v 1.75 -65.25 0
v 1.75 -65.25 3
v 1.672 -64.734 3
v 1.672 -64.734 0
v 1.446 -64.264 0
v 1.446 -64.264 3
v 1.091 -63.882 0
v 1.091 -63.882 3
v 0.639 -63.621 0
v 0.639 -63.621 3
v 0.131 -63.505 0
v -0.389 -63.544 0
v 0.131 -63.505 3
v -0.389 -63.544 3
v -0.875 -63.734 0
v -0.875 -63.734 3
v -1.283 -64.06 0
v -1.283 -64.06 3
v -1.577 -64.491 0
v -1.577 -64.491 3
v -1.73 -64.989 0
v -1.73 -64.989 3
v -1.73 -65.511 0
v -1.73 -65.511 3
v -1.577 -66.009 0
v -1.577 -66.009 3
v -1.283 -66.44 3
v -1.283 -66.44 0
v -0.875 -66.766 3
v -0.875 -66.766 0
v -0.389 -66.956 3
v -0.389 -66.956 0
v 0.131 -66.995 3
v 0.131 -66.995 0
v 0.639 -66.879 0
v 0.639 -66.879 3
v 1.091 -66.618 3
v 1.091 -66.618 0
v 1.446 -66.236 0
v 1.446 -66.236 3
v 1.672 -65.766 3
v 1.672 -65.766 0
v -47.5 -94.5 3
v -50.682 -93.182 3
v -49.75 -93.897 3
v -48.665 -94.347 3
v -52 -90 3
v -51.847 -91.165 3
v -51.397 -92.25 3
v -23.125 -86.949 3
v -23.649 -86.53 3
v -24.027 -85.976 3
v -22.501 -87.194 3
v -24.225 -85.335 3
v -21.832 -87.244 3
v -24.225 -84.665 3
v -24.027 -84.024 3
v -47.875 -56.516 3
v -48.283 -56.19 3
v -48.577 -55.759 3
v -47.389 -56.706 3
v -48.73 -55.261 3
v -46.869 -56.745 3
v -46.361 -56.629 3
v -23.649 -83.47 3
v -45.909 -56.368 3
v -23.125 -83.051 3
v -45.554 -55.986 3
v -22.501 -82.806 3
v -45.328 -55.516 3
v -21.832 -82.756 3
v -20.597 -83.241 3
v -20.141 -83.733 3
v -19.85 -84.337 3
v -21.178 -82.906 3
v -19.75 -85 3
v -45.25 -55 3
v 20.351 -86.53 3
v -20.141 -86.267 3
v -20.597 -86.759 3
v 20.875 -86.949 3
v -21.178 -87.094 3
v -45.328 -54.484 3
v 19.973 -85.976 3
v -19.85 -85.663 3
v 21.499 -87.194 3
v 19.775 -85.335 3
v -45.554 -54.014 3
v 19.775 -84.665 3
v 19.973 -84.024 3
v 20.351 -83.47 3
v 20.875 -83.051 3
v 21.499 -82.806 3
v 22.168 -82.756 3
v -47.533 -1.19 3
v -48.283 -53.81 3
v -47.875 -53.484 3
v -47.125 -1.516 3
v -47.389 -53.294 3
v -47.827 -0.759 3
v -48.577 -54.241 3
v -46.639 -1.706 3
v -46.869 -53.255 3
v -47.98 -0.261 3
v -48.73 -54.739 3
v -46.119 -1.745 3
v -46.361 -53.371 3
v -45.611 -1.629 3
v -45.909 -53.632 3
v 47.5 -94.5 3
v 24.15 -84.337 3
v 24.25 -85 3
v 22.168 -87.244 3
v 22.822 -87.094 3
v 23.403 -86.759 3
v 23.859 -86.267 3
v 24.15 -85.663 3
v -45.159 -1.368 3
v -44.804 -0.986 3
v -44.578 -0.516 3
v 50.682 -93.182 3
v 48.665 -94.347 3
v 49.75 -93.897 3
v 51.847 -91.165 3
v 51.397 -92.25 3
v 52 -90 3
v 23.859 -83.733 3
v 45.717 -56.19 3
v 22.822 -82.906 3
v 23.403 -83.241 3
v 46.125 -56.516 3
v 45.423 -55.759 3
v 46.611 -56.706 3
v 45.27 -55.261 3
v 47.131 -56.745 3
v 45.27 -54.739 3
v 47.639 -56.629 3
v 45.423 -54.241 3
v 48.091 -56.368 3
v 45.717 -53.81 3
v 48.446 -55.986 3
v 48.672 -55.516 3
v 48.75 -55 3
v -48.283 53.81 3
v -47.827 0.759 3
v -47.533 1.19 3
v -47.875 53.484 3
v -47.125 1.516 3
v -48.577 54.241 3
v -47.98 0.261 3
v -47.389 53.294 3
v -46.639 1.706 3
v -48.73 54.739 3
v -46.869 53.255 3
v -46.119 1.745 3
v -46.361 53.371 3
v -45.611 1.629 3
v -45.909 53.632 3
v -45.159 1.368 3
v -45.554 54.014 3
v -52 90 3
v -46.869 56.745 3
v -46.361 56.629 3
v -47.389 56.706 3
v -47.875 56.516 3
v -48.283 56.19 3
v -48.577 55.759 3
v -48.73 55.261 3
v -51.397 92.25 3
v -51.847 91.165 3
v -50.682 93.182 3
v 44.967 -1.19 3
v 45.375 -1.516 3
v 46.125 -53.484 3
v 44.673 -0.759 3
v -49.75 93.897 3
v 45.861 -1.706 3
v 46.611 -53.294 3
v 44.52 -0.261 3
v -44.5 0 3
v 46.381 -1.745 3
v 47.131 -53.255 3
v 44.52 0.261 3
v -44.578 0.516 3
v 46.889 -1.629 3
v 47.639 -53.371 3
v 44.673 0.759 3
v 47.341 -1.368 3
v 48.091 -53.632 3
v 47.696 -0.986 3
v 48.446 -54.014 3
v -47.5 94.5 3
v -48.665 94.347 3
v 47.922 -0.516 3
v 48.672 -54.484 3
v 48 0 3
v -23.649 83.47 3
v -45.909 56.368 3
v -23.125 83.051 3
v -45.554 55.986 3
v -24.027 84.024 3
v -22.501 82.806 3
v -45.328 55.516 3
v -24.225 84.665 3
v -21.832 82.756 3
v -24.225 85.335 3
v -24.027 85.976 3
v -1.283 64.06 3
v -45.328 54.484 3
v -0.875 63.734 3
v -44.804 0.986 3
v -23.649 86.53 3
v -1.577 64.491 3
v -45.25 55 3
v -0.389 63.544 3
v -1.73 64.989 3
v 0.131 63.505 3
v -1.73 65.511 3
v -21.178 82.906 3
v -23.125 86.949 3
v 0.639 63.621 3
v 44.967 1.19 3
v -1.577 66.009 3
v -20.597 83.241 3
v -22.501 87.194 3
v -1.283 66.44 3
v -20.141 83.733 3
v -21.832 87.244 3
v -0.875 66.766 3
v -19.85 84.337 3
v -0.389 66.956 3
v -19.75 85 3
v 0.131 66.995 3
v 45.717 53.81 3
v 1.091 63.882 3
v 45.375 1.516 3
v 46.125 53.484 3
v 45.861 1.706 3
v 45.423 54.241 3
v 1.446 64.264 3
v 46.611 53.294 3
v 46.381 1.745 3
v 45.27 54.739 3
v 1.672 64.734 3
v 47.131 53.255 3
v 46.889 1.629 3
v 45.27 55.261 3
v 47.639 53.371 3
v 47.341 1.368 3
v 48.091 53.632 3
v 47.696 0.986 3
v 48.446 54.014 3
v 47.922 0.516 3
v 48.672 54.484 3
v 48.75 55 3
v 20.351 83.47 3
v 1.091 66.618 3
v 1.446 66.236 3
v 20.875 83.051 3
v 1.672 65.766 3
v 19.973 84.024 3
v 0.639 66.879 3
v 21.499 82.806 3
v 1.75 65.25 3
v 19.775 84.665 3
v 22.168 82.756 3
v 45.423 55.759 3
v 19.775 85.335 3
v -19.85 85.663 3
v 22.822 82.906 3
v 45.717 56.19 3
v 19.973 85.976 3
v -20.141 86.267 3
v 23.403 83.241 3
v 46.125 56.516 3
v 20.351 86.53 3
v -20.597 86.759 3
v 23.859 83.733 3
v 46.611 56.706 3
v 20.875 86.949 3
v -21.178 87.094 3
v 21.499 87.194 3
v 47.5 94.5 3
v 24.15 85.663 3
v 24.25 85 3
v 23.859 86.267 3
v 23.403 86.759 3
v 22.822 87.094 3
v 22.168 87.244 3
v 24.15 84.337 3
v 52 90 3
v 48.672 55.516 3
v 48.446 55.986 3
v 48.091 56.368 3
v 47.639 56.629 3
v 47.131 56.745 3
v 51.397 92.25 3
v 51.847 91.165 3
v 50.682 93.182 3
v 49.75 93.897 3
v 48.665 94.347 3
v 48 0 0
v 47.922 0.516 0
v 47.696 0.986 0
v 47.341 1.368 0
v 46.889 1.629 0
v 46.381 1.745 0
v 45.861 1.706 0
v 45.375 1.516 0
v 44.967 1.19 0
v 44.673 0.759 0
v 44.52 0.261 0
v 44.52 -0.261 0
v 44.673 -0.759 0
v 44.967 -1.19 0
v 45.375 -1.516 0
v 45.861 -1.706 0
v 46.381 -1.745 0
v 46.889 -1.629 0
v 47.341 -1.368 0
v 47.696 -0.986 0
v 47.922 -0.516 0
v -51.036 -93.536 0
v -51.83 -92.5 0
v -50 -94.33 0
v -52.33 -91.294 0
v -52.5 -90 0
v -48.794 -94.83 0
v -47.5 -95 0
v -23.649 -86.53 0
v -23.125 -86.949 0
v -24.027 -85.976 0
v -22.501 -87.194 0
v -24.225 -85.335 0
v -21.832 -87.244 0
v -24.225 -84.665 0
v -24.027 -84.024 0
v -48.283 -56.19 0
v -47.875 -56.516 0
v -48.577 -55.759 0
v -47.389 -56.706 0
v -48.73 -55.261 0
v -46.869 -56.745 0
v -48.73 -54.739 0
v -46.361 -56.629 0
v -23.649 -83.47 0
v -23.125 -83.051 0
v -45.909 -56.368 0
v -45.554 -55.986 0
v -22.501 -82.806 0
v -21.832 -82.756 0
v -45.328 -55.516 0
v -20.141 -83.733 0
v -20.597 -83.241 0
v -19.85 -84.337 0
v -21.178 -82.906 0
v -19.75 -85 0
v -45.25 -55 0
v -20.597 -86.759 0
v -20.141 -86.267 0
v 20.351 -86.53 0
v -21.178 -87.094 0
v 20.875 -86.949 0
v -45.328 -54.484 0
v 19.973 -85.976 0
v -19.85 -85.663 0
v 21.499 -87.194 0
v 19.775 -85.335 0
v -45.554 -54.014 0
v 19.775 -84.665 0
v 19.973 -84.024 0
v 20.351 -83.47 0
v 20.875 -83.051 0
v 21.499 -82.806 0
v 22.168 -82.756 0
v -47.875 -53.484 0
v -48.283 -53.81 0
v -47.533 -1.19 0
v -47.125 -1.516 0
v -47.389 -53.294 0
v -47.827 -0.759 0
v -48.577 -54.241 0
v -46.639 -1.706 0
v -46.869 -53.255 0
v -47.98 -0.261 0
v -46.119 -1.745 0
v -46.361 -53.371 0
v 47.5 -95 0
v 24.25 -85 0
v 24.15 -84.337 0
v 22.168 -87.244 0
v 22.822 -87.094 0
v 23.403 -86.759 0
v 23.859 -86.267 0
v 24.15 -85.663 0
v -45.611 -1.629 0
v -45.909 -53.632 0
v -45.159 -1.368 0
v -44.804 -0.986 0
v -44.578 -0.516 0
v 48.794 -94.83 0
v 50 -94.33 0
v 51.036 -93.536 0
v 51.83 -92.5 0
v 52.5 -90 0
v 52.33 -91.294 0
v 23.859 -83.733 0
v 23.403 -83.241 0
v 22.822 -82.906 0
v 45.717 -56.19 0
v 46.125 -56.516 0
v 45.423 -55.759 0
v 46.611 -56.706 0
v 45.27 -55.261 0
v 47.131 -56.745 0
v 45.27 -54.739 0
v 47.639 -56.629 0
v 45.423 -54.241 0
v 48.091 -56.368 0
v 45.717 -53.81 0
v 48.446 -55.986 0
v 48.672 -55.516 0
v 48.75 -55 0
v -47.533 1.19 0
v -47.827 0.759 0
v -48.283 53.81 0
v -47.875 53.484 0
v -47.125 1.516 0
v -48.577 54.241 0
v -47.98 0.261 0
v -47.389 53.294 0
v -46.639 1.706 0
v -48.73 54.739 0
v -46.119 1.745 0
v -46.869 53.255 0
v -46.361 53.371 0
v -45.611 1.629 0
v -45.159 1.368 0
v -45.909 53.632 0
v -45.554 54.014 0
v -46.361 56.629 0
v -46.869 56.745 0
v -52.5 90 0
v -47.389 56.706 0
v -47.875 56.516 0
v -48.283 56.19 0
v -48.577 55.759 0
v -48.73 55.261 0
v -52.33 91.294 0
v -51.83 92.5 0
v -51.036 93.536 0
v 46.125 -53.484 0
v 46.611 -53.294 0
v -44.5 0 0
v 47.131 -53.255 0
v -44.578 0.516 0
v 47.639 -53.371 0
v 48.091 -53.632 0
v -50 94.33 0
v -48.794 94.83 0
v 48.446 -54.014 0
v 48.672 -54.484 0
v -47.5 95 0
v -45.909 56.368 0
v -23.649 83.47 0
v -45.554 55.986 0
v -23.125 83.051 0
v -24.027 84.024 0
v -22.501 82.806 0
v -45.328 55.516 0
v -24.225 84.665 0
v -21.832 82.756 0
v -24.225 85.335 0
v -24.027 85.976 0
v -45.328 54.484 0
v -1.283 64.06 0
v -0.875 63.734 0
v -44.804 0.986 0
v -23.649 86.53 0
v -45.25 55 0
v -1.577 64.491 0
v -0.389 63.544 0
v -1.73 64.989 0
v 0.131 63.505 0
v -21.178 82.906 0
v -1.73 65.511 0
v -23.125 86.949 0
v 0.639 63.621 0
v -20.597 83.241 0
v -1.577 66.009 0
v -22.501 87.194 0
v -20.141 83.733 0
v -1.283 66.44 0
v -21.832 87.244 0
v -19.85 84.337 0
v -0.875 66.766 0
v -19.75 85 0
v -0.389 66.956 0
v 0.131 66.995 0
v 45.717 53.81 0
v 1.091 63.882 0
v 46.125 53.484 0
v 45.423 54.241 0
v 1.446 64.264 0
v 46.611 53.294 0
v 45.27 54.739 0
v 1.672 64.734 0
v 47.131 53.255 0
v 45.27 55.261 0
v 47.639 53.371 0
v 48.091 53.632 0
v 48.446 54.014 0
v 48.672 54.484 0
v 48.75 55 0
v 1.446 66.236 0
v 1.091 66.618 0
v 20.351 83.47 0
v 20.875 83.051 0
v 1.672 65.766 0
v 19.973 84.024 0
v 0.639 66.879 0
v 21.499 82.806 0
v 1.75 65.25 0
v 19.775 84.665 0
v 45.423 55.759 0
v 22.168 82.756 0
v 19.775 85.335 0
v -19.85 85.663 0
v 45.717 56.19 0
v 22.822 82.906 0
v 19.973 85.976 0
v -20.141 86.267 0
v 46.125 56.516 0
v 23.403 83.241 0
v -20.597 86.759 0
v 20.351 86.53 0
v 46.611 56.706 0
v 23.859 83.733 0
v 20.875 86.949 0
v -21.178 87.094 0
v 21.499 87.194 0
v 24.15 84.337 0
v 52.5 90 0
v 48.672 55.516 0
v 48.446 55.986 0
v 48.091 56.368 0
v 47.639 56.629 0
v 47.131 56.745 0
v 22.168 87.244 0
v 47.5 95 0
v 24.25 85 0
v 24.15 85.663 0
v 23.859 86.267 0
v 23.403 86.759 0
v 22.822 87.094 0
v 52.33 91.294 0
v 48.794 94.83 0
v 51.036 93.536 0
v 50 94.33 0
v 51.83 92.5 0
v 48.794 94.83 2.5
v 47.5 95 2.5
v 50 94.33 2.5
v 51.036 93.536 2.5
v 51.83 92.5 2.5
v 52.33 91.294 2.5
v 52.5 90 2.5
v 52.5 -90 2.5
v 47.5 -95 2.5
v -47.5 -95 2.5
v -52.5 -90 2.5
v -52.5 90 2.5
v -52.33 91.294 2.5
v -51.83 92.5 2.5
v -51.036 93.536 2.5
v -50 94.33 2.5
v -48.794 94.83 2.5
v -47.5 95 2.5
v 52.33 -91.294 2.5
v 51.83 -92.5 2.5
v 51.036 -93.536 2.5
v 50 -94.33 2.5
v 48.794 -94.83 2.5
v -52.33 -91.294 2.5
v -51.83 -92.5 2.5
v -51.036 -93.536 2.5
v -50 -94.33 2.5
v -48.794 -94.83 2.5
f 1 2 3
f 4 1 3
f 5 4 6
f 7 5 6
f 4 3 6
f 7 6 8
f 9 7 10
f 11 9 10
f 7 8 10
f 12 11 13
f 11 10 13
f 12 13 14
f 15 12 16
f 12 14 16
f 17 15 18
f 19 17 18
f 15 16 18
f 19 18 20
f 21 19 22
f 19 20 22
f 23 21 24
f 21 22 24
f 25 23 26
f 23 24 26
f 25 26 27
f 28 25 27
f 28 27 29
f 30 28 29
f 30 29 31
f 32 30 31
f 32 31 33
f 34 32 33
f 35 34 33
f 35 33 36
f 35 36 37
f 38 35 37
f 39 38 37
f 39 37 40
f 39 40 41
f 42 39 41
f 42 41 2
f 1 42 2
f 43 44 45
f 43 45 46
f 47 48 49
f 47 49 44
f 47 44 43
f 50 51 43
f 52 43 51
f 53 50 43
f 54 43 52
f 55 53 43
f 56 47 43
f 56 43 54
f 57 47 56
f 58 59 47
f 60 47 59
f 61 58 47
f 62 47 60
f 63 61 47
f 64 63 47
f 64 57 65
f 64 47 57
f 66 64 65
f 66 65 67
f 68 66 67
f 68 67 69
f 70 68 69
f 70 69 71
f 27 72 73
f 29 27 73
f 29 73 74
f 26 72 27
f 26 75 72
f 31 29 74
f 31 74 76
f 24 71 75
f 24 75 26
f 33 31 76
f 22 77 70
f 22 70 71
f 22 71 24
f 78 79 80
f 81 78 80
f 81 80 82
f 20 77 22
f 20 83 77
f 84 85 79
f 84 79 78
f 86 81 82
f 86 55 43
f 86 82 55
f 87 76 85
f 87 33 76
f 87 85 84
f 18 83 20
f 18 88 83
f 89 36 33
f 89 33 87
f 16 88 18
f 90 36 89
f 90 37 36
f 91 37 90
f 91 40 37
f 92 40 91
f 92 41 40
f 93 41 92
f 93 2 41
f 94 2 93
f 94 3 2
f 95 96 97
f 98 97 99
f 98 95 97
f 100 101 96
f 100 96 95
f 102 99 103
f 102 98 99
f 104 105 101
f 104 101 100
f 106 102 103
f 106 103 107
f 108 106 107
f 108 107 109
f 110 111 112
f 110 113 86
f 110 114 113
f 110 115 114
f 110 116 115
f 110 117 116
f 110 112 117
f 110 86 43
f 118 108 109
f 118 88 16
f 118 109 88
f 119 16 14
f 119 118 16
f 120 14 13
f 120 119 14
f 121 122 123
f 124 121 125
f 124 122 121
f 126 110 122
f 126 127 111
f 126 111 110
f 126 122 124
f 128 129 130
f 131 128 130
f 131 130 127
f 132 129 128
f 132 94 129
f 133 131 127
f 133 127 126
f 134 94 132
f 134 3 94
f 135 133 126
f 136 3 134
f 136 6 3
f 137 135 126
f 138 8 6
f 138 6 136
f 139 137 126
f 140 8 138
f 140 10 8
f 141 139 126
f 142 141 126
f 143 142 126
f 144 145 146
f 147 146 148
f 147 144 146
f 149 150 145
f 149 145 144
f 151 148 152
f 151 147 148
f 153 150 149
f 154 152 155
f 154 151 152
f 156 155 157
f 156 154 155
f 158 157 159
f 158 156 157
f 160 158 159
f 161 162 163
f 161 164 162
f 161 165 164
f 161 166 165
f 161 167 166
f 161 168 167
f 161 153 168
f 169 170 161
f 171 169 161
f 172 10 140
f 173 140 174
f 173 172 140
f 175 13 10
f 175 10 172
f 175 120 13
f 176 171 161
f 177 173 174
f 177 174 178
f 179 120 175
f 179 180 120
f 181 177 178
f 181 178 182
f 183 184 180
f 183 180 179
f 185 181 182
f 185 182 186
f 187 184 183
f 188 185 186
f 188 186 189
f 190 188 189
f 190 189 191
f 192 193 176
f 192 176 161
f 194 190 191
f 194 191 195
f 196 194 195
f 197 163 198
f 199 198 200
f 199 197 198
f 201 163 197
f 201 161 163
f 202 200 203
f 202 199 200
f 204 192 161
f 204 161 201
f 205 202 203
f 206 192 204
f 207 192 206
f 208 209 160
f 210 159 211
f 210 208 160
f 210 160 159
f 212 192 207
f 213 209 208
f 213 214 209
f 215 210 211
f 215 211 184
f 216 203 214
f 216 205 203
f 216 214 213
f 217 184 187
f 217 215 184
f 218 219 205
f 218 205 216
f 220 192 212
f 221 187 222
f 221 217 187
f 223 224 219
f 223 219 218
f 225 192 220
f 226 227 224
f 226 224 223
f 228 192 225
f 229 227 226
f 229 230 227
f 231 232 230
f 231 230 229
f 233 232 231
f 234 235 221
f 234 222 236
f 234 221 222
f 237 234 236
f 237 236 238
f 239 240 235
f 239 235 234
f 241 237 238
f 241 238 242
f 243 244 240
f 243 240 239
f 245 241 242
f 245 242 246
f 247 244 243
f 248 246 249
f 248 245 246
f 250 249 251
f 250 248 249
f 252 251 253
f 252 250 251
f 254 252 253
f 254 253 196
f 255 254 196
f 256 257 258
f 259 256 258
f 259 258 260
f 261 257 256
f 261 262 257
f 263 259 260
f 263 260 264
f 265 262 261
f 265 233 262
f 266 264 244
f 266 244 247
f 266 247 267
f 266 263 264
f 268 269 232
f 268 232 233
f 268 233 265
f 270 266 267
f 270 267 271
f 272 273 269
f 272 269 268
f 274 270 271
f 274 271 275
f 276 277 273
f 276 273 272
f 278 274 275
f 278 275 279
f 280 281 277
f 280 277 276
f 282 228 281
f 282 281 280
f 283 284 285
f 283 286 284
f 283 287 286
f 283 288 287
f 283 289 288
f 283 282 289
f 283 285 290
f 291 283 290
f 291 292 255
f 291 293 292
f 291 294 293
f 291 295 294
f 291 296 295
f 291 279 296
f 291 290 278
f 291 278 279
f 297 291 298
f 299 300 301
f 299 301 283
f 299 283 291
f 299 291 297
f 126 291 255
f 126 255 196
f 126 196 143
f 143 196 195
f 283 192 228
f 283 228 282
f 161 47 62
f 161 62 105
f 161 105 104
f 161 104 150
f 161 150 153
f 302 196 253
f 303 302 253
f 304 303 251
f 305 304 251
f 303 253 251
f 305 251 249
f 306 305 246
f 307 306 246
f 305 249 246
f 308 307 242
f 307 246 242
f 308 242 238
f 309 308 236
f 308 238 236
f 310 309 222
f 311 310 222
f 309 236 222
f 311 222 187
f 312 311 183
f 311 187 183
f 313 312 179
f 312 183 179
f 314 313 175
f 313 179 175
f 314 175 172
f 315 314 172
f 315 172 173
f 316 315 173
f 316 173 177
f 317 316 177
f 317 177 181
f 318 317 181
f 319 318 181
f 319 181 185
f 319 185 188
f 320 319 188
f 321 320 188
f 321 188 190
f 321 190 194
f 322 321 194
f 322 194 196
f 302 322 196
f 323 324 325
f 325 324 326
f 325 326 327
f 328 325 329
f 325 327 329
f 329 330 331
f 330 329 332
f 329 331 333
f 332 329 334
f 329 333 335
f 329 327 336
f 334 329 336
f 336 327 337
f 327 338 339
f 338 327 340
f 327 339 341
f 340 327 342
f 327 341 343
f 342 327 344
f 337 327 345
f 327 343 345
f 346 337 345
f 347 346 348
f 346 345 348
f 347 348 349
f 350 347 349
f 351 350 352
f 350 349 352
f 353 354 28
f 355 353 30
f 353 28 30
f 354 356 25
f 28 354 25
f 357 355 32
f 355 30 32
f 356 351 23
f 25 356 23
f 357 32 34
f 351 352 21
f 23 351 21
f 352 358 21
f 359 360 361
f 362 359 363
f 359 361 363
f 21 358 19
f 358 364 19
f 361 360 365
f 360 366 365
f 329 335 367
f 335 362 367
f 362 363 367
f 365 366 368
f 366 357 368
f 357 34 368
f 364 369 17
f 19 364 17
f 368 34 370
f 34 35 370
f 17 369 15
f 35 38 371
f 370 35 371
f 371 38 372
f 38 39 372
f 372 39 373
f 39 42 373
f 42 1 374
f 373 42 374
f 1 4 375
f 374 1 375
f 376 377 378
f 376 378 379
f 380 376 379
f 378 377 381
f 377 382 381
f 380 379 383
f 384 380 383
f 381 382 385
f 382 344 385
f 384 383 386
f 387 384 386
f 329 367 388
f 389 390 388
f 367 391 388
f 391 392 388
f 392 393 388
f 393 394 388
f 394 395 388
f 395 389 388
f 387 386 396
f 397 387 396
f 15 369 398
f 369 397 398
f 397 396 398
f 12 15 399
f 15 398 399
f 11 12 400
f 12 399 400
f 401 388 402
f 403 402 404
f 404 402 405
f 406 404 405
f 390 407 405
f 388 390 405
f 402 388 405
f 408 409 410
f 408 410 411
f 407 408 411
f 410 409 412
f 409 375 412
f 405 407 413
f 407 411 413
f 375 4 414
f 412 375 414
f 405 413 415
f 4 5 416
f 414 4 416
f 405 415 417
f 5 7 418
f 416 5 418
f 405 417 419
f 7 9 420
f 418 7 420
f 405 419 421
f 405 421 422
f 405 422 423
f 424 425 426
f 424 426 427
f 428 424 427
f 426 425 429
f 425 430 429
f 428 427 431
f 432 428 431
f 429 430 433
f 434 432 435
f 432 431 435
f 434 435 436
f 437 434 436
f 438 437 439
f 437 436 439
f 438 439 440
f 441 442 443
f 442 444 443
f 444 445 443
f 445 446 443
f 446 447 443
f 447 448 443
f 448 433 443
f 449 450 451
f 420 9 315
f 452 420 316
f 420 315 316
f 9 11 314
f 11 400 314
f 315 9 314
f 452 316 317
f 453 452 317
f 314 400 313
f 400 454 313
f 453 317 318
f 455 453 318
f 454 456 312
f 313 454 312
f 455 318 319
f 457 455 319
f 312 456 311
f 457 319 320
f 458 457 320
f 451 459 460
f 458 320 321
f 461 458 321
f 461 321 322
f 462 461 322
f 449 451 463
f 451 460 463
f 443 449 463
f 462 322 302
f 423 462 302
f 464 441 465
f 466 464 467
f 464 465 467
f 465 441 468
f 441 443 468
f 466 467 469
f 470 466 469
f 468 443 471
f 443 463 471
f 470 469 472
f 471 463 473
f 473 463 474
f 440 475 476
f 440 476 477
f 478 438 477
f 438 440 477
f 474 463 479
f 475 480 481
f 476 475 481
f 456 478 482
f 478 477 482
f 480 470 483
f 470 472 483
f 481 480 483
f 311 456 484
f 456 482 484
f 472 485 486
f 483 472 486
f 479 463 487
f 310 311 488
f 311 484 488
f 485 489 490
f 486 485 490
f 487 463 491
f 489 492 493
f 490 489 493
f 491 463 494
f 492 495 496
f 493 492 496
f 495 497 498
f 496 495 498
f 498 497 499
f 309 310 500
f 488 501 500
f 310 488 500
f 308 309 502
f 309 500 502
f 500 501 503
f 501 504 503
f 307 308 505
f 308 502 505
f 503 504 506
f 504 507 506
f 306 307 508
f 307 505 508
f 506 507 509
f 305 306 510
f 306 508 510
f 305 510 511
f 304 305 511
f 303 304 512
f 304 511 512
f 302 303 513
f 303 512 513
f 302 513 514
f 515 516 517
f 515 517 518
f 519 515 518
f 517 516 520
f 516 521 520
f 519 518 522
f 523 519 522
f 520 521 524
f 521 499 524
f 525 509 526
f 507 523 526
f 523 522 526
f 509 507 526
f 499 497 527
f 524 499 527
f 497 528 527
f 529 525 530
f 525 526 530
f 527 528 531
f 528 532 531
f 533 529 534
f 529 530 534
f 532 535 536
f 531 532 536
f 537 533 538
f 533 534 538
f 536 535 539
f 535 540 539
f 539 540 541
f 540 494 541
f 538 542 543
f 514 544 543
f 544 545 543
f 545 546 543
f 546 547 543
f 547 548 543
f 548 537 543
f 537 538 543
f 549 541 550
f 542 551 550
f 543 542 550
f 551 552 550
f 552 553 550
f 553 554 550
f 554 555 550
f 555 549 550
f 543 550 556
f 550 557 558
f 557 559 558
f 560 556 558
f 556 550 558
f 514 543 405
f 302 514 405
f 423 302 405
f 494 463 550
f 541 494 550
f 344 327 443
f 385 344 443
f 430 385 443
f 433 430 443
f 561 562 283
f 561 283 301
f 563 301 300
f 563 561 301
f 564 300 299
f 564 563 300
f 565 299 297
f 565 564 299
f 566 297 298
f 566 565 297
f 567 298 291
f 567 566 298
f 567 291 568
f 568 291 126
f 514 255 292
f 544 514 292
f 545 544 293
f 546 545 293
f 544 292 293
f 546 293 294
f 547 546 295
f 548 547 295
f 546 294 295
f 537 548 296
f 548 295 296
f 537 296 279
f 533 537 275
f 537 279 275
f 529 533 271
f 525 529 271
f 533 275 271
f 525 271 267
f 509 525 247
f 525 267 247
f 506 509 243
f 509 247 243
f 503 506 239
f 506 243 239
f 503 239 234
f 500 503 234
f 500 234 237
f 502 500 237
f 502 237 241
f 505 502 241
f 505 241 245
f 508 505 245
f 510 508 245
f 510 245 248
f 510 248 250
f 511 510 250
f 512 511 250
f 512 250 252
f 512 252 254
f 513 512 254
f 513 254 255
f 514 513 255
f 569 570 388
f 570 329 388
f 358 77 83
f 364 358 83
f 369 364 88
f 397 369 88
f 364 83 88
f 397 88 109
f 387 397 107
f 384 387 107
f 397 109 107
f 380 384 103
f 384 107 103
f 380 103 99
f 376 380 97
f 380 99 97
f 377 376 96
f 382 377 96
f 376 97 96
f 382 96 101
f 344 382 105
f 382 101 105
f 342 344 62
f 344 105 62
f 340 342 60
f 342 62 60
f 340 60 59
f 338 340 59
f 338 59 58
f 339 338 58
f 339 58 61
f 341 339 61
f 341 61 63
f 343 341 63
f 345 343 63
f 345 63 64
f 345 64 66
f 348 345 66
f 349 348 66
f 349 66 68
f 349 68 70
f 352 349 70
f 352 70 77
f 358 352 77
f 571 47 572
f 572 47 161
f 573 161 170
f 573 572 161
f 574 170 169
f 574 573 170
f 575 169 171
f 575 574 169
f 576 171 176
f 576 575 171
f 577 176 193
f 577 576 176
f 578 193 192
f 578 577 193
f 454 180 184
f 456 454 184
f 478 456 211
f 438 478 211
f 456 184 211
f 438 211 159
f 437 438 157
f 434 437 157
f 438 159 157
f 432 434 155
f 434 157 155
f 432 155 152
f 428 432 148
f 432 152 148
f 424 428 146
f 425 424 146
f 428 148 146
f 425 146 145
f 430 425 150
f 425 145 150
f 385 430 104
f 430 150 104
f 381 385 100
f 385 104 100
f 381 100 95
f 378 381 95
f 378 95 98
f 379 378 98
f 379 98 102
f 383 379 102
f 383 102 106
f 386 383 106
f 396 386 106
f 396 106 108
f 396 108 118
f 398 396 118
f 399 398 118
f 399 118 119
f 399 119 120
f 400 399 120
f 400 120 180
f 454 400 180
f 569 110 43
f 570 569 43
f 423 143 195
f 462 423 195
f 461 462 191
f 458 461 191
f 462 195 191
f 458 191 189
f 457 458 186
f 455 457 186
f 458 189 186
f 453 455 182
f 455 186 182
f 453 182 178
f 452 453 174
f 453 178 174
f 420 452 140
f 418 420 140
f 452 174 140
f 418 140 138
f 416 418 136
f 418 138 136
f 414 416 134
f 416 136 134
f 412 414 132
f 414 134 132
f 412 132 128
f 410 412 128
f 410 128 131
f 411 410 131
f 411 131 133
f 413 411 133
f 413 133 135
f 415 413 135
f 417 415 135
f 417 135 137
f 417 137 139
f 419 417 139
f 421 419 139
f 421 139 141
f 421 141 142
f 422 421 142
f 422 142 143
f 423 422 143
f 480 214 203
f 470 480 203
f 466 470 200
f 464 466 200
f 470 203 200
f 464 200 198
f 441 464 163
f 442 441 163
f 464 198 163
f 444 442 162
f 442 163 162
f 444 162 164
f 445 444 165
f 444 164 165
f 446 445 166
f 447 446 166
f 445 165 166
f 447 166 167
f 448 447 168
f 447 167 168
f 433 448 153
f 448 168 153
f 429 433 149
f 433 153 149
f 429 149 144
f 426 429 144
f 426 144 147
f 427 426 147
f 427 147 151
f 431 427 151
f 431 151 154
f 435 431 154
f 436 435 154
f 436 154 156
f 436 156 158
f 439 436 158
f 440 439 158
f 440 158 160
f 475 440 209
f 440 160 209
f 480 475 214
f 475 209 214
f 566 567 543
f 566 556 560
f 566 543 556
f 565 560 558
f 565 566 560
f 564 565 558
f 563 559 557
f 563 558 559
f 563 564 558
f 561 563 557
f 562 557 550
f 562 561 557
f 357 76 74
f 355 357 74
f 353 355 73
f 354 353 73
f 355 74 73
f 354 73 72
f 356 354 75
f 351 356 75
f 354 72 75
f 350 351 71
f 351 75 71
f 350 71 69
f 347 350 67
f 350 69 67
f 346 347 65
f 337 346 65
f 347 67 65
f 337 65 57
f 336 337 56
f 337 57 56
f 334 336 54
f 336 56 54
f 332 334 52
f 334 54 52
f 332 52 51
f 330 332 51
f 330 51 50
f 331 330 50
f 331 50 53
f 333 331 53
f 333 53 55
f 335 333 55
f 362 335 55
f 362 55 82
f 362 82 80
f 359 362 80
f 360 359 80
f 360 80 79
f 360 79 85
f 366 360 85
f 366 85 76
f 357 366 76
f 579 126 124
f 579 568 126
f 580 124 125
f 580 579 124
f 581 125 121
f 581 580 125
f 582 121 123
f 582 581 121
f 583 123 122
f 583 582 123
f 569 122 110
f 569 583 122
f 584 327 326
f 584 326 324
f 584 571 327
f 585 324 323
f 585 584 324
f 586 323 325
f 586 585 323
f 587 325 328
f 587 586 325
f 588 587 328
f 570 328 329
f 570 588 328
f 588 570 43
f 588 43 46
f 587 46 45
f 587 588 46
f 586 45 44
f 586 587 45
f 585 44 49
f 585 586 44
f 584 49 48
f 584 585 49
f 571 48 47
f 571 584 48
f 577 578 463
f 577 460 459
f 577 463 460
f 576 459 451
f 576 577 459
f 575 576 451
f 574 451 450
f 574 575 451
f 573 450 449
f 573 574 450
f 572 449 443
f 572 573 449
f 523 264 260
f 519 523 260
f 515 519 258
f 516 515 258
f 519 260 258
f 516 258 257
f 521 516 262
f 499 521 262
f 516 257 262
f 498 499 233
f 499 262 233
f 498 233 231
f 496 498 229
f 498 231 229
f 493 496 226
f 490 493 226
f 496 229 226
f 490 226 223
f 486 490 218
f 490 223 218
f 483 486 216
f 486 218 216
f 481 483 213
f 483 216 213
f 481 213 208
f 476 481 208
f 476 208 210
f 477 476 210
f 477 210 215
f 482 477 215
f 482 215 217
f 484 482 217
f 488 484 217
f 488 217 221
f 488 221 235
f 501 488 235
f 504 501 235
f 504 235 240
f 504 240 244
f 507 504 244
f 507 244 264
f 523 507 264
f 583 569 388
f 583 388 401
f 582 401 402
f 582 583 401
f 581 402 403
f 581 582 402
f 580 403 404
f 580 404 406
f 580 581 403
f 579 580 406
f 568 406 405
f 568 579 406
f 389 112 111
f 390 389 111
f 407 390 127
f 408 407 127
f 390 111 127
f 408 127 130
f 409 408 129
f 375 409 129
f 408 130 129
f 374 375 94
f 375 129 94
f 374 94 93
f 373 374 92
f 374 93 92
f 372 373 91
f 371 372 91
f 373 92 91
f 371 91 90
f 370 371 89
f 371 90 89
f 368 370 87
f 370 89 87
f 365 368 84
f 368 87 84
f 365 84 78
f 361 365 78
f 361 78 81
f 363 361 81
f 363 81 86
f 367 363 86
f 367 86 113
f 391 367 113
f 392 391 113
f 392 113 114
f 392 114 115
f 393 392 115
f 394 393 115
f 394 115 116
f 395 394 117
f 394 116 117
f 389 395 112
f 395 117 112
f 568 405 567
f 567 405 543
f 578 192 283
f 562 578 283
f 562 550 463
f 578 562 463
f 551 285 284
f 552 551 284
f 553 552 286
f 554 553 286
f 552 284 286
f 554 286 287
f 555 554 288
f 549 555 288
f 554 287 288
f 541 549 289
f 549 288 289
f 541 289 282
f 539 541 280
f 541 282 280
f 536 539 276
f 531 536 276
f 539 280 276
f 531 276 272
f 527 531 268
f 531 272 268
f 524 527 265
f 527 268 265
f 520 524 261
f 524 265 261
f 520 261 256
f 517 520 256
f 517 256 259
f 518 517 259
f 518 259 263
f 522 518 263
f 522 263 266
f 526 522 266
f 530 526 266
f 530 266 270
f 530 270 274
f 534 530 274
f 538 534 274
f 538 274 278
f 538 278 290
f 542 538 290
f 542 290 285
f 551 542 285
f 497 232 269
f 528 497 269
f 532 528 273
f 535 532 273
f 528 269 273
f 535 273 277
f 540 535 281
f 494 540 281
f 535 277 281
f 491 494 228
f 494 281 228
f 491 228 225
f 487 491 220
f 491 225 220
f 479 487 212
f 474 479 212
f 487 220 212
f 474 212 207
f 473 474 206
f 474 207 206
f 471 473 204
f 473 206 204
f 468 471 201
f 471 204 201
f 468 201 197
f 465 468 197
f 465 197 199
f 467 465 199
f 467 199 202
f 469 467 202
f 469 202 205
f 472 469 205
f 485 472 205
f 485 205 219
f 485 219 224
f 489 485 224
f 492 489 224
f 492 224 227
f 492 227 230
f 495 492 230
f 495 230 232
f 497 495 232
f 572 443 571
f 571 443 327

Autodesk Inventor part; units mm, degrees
ref_plane "YZ Plane" through (0, 0, 0) normal (1, 0, 0) x (0, 1, 0)
ref_plane "XZ Plane" through (0, 0, 0) normal (0, 1, 0) x (-1, 0, 0)
ref_plane "XY Plane" through (0, 0, 0) normal (0, 0, 1) x (1, 0, 0)
sketch "Sketch1" plane through (0, 0, 0) normal (0, 0, 1) x (1, 0, 0)
  line L0 (-52.5, -95) -> (52.5, -95)
  line L1 (52.5, -95) -> (52.5, 95)
  line L2 (52.5, 95) -> (-52.5, 95)
  line L3 (-52.5, 95) -> (-52.5, -95)
  line L4 (-52.5, -95) -> (52.5, 95) construction
  line L5 (52.5, -95) -> (-52.5, 95) construction
  point P0 (0, 0)
  dimension "d0" = 190
  dimension "d1" = 105
extrude "Extrusion1" add sketch "Sketch1" along normal blind 3
sketch "Sketch2" plane through (0, 0, 3) normal (0, 0, 1) x (1, 0, 0)
  circle A0 centre (-47, 55) radius 1.75
  line L0 (-52.5, 95) -> (-52.5, -95) construction
  line L1 (-73.5, 0) -> (73.5, 0) projected
  line L2 (0, 133) -> (0, -133) projected
  circle A1 centre (47, 55) radius 1.75
  circle A2 centre (-47, -55) radius 1.75
  circle A3 centre (47, -55) radius 1.75
  point P0 (0, 0)
  point P1 (52.5, 95)
  point P2 (52.5, -95)
  dimension "d6" = 47
  dimension "d7" = 3.5
  dimension "d8" = 55
extrude "Extrusion2" cut sketch "Sketch2" against normal blind 3
sketch "Sketch3" plane through (0, 0, 3) normal (0, 0, 1) x (1, 0, 0)
  circle A0 centre (-22, 85) radius 2.25
  line L0 (52.5, 95) -> (-52.5, 95) construction
  line L1 (0, 133) -> (0, -133) projected
  line L2 (-73.5, 0) -> (73.5, 0) projected
  circle A1 centre (22, 85) radius 2.25
  circle A2 centre (-22, -85) radius 2.25
  line L3 (52.5, -95) -> (-52.5, -95) construction
  circle A3 centre (22, -85) radius 2.25
  point P0 (0, 0)
  dimension "d11" = 10
  dimension "d12" = 4.5
extrude "Extrusion3" cut sketch "Sketch3" against normal blind 3
sketch "Sketch4" plane through (0, 0, 3) normal (0, 0, 1) x (1, 0, 0)
  line L0 (-40, -59) -> (40, -59) construction
  line L1 (40, -59) -> (40, 59) construction
  line L2 (40, 59) -> (-40, 59) construction
  line L3 (-40, 59) -> (-40, -59) construction
  line L4 (-40, -59) -> (40, 59) construction
  line L5 (40, -59) -> (-40, 59) construction
  line L6 (-73.5, 0) -> (73.5, 0) construction
  line L7 (0, -133) -> (0, 133) construction
  circle A0 centre (0, 65.25) radius 1.75
  circle A1 centre (-46.25, 0) radius 1.75
  circle A2 centre (0, -65.25) radius 1.75
  circle A3 centre (46.25, 0) radius 1.75
  line L8 (-52.5, 95) -> (-52.5, -95) projected
  circle A4 centre (-47, -55) radius 1.75 projected
  circle A5 centre (-47, 55) radius 1.75 projected
  point P0 (0, 0)
  dimension "d15" = 80
  dimension "d16" = 118
  dimension "d17" = 3.5
  dimension "d18" = 3.5
  dimension "d19" = 12.5
  dimension "d21" = 6.25
  dimension "d24" = 6.25
  dimension "d29" = 110
extrude "Extrusion4" cut sketch "Sketch4" against normal blind 3 contours A0 | A1 | A2 | A3
fillet "Fillet1" radius 5 4 edges at (-52.5, -95, 1.5) (52.5, -95, 1.5) (52.5, 95, 1.5) (-52.5, 95, 1.5)
chamfer "Chamfer1" distance 0.5 angle 45 8 edges at (-52.5, 0, 3) (-51.0355, -93.5355, 3) (0, -95, 3) (51.0355, -93.5355, 3) (52.5, 0, 3) (51.0355, 93.5355, 3) (0, 95, 3) (-51.0355, 93.5355, 3)
equation "\"d18\" = d17"
equation "\"d21\" = d24"
equation "\"d24\" = 0.5 * d19"
properties part number "BatteryHolderBottom"
